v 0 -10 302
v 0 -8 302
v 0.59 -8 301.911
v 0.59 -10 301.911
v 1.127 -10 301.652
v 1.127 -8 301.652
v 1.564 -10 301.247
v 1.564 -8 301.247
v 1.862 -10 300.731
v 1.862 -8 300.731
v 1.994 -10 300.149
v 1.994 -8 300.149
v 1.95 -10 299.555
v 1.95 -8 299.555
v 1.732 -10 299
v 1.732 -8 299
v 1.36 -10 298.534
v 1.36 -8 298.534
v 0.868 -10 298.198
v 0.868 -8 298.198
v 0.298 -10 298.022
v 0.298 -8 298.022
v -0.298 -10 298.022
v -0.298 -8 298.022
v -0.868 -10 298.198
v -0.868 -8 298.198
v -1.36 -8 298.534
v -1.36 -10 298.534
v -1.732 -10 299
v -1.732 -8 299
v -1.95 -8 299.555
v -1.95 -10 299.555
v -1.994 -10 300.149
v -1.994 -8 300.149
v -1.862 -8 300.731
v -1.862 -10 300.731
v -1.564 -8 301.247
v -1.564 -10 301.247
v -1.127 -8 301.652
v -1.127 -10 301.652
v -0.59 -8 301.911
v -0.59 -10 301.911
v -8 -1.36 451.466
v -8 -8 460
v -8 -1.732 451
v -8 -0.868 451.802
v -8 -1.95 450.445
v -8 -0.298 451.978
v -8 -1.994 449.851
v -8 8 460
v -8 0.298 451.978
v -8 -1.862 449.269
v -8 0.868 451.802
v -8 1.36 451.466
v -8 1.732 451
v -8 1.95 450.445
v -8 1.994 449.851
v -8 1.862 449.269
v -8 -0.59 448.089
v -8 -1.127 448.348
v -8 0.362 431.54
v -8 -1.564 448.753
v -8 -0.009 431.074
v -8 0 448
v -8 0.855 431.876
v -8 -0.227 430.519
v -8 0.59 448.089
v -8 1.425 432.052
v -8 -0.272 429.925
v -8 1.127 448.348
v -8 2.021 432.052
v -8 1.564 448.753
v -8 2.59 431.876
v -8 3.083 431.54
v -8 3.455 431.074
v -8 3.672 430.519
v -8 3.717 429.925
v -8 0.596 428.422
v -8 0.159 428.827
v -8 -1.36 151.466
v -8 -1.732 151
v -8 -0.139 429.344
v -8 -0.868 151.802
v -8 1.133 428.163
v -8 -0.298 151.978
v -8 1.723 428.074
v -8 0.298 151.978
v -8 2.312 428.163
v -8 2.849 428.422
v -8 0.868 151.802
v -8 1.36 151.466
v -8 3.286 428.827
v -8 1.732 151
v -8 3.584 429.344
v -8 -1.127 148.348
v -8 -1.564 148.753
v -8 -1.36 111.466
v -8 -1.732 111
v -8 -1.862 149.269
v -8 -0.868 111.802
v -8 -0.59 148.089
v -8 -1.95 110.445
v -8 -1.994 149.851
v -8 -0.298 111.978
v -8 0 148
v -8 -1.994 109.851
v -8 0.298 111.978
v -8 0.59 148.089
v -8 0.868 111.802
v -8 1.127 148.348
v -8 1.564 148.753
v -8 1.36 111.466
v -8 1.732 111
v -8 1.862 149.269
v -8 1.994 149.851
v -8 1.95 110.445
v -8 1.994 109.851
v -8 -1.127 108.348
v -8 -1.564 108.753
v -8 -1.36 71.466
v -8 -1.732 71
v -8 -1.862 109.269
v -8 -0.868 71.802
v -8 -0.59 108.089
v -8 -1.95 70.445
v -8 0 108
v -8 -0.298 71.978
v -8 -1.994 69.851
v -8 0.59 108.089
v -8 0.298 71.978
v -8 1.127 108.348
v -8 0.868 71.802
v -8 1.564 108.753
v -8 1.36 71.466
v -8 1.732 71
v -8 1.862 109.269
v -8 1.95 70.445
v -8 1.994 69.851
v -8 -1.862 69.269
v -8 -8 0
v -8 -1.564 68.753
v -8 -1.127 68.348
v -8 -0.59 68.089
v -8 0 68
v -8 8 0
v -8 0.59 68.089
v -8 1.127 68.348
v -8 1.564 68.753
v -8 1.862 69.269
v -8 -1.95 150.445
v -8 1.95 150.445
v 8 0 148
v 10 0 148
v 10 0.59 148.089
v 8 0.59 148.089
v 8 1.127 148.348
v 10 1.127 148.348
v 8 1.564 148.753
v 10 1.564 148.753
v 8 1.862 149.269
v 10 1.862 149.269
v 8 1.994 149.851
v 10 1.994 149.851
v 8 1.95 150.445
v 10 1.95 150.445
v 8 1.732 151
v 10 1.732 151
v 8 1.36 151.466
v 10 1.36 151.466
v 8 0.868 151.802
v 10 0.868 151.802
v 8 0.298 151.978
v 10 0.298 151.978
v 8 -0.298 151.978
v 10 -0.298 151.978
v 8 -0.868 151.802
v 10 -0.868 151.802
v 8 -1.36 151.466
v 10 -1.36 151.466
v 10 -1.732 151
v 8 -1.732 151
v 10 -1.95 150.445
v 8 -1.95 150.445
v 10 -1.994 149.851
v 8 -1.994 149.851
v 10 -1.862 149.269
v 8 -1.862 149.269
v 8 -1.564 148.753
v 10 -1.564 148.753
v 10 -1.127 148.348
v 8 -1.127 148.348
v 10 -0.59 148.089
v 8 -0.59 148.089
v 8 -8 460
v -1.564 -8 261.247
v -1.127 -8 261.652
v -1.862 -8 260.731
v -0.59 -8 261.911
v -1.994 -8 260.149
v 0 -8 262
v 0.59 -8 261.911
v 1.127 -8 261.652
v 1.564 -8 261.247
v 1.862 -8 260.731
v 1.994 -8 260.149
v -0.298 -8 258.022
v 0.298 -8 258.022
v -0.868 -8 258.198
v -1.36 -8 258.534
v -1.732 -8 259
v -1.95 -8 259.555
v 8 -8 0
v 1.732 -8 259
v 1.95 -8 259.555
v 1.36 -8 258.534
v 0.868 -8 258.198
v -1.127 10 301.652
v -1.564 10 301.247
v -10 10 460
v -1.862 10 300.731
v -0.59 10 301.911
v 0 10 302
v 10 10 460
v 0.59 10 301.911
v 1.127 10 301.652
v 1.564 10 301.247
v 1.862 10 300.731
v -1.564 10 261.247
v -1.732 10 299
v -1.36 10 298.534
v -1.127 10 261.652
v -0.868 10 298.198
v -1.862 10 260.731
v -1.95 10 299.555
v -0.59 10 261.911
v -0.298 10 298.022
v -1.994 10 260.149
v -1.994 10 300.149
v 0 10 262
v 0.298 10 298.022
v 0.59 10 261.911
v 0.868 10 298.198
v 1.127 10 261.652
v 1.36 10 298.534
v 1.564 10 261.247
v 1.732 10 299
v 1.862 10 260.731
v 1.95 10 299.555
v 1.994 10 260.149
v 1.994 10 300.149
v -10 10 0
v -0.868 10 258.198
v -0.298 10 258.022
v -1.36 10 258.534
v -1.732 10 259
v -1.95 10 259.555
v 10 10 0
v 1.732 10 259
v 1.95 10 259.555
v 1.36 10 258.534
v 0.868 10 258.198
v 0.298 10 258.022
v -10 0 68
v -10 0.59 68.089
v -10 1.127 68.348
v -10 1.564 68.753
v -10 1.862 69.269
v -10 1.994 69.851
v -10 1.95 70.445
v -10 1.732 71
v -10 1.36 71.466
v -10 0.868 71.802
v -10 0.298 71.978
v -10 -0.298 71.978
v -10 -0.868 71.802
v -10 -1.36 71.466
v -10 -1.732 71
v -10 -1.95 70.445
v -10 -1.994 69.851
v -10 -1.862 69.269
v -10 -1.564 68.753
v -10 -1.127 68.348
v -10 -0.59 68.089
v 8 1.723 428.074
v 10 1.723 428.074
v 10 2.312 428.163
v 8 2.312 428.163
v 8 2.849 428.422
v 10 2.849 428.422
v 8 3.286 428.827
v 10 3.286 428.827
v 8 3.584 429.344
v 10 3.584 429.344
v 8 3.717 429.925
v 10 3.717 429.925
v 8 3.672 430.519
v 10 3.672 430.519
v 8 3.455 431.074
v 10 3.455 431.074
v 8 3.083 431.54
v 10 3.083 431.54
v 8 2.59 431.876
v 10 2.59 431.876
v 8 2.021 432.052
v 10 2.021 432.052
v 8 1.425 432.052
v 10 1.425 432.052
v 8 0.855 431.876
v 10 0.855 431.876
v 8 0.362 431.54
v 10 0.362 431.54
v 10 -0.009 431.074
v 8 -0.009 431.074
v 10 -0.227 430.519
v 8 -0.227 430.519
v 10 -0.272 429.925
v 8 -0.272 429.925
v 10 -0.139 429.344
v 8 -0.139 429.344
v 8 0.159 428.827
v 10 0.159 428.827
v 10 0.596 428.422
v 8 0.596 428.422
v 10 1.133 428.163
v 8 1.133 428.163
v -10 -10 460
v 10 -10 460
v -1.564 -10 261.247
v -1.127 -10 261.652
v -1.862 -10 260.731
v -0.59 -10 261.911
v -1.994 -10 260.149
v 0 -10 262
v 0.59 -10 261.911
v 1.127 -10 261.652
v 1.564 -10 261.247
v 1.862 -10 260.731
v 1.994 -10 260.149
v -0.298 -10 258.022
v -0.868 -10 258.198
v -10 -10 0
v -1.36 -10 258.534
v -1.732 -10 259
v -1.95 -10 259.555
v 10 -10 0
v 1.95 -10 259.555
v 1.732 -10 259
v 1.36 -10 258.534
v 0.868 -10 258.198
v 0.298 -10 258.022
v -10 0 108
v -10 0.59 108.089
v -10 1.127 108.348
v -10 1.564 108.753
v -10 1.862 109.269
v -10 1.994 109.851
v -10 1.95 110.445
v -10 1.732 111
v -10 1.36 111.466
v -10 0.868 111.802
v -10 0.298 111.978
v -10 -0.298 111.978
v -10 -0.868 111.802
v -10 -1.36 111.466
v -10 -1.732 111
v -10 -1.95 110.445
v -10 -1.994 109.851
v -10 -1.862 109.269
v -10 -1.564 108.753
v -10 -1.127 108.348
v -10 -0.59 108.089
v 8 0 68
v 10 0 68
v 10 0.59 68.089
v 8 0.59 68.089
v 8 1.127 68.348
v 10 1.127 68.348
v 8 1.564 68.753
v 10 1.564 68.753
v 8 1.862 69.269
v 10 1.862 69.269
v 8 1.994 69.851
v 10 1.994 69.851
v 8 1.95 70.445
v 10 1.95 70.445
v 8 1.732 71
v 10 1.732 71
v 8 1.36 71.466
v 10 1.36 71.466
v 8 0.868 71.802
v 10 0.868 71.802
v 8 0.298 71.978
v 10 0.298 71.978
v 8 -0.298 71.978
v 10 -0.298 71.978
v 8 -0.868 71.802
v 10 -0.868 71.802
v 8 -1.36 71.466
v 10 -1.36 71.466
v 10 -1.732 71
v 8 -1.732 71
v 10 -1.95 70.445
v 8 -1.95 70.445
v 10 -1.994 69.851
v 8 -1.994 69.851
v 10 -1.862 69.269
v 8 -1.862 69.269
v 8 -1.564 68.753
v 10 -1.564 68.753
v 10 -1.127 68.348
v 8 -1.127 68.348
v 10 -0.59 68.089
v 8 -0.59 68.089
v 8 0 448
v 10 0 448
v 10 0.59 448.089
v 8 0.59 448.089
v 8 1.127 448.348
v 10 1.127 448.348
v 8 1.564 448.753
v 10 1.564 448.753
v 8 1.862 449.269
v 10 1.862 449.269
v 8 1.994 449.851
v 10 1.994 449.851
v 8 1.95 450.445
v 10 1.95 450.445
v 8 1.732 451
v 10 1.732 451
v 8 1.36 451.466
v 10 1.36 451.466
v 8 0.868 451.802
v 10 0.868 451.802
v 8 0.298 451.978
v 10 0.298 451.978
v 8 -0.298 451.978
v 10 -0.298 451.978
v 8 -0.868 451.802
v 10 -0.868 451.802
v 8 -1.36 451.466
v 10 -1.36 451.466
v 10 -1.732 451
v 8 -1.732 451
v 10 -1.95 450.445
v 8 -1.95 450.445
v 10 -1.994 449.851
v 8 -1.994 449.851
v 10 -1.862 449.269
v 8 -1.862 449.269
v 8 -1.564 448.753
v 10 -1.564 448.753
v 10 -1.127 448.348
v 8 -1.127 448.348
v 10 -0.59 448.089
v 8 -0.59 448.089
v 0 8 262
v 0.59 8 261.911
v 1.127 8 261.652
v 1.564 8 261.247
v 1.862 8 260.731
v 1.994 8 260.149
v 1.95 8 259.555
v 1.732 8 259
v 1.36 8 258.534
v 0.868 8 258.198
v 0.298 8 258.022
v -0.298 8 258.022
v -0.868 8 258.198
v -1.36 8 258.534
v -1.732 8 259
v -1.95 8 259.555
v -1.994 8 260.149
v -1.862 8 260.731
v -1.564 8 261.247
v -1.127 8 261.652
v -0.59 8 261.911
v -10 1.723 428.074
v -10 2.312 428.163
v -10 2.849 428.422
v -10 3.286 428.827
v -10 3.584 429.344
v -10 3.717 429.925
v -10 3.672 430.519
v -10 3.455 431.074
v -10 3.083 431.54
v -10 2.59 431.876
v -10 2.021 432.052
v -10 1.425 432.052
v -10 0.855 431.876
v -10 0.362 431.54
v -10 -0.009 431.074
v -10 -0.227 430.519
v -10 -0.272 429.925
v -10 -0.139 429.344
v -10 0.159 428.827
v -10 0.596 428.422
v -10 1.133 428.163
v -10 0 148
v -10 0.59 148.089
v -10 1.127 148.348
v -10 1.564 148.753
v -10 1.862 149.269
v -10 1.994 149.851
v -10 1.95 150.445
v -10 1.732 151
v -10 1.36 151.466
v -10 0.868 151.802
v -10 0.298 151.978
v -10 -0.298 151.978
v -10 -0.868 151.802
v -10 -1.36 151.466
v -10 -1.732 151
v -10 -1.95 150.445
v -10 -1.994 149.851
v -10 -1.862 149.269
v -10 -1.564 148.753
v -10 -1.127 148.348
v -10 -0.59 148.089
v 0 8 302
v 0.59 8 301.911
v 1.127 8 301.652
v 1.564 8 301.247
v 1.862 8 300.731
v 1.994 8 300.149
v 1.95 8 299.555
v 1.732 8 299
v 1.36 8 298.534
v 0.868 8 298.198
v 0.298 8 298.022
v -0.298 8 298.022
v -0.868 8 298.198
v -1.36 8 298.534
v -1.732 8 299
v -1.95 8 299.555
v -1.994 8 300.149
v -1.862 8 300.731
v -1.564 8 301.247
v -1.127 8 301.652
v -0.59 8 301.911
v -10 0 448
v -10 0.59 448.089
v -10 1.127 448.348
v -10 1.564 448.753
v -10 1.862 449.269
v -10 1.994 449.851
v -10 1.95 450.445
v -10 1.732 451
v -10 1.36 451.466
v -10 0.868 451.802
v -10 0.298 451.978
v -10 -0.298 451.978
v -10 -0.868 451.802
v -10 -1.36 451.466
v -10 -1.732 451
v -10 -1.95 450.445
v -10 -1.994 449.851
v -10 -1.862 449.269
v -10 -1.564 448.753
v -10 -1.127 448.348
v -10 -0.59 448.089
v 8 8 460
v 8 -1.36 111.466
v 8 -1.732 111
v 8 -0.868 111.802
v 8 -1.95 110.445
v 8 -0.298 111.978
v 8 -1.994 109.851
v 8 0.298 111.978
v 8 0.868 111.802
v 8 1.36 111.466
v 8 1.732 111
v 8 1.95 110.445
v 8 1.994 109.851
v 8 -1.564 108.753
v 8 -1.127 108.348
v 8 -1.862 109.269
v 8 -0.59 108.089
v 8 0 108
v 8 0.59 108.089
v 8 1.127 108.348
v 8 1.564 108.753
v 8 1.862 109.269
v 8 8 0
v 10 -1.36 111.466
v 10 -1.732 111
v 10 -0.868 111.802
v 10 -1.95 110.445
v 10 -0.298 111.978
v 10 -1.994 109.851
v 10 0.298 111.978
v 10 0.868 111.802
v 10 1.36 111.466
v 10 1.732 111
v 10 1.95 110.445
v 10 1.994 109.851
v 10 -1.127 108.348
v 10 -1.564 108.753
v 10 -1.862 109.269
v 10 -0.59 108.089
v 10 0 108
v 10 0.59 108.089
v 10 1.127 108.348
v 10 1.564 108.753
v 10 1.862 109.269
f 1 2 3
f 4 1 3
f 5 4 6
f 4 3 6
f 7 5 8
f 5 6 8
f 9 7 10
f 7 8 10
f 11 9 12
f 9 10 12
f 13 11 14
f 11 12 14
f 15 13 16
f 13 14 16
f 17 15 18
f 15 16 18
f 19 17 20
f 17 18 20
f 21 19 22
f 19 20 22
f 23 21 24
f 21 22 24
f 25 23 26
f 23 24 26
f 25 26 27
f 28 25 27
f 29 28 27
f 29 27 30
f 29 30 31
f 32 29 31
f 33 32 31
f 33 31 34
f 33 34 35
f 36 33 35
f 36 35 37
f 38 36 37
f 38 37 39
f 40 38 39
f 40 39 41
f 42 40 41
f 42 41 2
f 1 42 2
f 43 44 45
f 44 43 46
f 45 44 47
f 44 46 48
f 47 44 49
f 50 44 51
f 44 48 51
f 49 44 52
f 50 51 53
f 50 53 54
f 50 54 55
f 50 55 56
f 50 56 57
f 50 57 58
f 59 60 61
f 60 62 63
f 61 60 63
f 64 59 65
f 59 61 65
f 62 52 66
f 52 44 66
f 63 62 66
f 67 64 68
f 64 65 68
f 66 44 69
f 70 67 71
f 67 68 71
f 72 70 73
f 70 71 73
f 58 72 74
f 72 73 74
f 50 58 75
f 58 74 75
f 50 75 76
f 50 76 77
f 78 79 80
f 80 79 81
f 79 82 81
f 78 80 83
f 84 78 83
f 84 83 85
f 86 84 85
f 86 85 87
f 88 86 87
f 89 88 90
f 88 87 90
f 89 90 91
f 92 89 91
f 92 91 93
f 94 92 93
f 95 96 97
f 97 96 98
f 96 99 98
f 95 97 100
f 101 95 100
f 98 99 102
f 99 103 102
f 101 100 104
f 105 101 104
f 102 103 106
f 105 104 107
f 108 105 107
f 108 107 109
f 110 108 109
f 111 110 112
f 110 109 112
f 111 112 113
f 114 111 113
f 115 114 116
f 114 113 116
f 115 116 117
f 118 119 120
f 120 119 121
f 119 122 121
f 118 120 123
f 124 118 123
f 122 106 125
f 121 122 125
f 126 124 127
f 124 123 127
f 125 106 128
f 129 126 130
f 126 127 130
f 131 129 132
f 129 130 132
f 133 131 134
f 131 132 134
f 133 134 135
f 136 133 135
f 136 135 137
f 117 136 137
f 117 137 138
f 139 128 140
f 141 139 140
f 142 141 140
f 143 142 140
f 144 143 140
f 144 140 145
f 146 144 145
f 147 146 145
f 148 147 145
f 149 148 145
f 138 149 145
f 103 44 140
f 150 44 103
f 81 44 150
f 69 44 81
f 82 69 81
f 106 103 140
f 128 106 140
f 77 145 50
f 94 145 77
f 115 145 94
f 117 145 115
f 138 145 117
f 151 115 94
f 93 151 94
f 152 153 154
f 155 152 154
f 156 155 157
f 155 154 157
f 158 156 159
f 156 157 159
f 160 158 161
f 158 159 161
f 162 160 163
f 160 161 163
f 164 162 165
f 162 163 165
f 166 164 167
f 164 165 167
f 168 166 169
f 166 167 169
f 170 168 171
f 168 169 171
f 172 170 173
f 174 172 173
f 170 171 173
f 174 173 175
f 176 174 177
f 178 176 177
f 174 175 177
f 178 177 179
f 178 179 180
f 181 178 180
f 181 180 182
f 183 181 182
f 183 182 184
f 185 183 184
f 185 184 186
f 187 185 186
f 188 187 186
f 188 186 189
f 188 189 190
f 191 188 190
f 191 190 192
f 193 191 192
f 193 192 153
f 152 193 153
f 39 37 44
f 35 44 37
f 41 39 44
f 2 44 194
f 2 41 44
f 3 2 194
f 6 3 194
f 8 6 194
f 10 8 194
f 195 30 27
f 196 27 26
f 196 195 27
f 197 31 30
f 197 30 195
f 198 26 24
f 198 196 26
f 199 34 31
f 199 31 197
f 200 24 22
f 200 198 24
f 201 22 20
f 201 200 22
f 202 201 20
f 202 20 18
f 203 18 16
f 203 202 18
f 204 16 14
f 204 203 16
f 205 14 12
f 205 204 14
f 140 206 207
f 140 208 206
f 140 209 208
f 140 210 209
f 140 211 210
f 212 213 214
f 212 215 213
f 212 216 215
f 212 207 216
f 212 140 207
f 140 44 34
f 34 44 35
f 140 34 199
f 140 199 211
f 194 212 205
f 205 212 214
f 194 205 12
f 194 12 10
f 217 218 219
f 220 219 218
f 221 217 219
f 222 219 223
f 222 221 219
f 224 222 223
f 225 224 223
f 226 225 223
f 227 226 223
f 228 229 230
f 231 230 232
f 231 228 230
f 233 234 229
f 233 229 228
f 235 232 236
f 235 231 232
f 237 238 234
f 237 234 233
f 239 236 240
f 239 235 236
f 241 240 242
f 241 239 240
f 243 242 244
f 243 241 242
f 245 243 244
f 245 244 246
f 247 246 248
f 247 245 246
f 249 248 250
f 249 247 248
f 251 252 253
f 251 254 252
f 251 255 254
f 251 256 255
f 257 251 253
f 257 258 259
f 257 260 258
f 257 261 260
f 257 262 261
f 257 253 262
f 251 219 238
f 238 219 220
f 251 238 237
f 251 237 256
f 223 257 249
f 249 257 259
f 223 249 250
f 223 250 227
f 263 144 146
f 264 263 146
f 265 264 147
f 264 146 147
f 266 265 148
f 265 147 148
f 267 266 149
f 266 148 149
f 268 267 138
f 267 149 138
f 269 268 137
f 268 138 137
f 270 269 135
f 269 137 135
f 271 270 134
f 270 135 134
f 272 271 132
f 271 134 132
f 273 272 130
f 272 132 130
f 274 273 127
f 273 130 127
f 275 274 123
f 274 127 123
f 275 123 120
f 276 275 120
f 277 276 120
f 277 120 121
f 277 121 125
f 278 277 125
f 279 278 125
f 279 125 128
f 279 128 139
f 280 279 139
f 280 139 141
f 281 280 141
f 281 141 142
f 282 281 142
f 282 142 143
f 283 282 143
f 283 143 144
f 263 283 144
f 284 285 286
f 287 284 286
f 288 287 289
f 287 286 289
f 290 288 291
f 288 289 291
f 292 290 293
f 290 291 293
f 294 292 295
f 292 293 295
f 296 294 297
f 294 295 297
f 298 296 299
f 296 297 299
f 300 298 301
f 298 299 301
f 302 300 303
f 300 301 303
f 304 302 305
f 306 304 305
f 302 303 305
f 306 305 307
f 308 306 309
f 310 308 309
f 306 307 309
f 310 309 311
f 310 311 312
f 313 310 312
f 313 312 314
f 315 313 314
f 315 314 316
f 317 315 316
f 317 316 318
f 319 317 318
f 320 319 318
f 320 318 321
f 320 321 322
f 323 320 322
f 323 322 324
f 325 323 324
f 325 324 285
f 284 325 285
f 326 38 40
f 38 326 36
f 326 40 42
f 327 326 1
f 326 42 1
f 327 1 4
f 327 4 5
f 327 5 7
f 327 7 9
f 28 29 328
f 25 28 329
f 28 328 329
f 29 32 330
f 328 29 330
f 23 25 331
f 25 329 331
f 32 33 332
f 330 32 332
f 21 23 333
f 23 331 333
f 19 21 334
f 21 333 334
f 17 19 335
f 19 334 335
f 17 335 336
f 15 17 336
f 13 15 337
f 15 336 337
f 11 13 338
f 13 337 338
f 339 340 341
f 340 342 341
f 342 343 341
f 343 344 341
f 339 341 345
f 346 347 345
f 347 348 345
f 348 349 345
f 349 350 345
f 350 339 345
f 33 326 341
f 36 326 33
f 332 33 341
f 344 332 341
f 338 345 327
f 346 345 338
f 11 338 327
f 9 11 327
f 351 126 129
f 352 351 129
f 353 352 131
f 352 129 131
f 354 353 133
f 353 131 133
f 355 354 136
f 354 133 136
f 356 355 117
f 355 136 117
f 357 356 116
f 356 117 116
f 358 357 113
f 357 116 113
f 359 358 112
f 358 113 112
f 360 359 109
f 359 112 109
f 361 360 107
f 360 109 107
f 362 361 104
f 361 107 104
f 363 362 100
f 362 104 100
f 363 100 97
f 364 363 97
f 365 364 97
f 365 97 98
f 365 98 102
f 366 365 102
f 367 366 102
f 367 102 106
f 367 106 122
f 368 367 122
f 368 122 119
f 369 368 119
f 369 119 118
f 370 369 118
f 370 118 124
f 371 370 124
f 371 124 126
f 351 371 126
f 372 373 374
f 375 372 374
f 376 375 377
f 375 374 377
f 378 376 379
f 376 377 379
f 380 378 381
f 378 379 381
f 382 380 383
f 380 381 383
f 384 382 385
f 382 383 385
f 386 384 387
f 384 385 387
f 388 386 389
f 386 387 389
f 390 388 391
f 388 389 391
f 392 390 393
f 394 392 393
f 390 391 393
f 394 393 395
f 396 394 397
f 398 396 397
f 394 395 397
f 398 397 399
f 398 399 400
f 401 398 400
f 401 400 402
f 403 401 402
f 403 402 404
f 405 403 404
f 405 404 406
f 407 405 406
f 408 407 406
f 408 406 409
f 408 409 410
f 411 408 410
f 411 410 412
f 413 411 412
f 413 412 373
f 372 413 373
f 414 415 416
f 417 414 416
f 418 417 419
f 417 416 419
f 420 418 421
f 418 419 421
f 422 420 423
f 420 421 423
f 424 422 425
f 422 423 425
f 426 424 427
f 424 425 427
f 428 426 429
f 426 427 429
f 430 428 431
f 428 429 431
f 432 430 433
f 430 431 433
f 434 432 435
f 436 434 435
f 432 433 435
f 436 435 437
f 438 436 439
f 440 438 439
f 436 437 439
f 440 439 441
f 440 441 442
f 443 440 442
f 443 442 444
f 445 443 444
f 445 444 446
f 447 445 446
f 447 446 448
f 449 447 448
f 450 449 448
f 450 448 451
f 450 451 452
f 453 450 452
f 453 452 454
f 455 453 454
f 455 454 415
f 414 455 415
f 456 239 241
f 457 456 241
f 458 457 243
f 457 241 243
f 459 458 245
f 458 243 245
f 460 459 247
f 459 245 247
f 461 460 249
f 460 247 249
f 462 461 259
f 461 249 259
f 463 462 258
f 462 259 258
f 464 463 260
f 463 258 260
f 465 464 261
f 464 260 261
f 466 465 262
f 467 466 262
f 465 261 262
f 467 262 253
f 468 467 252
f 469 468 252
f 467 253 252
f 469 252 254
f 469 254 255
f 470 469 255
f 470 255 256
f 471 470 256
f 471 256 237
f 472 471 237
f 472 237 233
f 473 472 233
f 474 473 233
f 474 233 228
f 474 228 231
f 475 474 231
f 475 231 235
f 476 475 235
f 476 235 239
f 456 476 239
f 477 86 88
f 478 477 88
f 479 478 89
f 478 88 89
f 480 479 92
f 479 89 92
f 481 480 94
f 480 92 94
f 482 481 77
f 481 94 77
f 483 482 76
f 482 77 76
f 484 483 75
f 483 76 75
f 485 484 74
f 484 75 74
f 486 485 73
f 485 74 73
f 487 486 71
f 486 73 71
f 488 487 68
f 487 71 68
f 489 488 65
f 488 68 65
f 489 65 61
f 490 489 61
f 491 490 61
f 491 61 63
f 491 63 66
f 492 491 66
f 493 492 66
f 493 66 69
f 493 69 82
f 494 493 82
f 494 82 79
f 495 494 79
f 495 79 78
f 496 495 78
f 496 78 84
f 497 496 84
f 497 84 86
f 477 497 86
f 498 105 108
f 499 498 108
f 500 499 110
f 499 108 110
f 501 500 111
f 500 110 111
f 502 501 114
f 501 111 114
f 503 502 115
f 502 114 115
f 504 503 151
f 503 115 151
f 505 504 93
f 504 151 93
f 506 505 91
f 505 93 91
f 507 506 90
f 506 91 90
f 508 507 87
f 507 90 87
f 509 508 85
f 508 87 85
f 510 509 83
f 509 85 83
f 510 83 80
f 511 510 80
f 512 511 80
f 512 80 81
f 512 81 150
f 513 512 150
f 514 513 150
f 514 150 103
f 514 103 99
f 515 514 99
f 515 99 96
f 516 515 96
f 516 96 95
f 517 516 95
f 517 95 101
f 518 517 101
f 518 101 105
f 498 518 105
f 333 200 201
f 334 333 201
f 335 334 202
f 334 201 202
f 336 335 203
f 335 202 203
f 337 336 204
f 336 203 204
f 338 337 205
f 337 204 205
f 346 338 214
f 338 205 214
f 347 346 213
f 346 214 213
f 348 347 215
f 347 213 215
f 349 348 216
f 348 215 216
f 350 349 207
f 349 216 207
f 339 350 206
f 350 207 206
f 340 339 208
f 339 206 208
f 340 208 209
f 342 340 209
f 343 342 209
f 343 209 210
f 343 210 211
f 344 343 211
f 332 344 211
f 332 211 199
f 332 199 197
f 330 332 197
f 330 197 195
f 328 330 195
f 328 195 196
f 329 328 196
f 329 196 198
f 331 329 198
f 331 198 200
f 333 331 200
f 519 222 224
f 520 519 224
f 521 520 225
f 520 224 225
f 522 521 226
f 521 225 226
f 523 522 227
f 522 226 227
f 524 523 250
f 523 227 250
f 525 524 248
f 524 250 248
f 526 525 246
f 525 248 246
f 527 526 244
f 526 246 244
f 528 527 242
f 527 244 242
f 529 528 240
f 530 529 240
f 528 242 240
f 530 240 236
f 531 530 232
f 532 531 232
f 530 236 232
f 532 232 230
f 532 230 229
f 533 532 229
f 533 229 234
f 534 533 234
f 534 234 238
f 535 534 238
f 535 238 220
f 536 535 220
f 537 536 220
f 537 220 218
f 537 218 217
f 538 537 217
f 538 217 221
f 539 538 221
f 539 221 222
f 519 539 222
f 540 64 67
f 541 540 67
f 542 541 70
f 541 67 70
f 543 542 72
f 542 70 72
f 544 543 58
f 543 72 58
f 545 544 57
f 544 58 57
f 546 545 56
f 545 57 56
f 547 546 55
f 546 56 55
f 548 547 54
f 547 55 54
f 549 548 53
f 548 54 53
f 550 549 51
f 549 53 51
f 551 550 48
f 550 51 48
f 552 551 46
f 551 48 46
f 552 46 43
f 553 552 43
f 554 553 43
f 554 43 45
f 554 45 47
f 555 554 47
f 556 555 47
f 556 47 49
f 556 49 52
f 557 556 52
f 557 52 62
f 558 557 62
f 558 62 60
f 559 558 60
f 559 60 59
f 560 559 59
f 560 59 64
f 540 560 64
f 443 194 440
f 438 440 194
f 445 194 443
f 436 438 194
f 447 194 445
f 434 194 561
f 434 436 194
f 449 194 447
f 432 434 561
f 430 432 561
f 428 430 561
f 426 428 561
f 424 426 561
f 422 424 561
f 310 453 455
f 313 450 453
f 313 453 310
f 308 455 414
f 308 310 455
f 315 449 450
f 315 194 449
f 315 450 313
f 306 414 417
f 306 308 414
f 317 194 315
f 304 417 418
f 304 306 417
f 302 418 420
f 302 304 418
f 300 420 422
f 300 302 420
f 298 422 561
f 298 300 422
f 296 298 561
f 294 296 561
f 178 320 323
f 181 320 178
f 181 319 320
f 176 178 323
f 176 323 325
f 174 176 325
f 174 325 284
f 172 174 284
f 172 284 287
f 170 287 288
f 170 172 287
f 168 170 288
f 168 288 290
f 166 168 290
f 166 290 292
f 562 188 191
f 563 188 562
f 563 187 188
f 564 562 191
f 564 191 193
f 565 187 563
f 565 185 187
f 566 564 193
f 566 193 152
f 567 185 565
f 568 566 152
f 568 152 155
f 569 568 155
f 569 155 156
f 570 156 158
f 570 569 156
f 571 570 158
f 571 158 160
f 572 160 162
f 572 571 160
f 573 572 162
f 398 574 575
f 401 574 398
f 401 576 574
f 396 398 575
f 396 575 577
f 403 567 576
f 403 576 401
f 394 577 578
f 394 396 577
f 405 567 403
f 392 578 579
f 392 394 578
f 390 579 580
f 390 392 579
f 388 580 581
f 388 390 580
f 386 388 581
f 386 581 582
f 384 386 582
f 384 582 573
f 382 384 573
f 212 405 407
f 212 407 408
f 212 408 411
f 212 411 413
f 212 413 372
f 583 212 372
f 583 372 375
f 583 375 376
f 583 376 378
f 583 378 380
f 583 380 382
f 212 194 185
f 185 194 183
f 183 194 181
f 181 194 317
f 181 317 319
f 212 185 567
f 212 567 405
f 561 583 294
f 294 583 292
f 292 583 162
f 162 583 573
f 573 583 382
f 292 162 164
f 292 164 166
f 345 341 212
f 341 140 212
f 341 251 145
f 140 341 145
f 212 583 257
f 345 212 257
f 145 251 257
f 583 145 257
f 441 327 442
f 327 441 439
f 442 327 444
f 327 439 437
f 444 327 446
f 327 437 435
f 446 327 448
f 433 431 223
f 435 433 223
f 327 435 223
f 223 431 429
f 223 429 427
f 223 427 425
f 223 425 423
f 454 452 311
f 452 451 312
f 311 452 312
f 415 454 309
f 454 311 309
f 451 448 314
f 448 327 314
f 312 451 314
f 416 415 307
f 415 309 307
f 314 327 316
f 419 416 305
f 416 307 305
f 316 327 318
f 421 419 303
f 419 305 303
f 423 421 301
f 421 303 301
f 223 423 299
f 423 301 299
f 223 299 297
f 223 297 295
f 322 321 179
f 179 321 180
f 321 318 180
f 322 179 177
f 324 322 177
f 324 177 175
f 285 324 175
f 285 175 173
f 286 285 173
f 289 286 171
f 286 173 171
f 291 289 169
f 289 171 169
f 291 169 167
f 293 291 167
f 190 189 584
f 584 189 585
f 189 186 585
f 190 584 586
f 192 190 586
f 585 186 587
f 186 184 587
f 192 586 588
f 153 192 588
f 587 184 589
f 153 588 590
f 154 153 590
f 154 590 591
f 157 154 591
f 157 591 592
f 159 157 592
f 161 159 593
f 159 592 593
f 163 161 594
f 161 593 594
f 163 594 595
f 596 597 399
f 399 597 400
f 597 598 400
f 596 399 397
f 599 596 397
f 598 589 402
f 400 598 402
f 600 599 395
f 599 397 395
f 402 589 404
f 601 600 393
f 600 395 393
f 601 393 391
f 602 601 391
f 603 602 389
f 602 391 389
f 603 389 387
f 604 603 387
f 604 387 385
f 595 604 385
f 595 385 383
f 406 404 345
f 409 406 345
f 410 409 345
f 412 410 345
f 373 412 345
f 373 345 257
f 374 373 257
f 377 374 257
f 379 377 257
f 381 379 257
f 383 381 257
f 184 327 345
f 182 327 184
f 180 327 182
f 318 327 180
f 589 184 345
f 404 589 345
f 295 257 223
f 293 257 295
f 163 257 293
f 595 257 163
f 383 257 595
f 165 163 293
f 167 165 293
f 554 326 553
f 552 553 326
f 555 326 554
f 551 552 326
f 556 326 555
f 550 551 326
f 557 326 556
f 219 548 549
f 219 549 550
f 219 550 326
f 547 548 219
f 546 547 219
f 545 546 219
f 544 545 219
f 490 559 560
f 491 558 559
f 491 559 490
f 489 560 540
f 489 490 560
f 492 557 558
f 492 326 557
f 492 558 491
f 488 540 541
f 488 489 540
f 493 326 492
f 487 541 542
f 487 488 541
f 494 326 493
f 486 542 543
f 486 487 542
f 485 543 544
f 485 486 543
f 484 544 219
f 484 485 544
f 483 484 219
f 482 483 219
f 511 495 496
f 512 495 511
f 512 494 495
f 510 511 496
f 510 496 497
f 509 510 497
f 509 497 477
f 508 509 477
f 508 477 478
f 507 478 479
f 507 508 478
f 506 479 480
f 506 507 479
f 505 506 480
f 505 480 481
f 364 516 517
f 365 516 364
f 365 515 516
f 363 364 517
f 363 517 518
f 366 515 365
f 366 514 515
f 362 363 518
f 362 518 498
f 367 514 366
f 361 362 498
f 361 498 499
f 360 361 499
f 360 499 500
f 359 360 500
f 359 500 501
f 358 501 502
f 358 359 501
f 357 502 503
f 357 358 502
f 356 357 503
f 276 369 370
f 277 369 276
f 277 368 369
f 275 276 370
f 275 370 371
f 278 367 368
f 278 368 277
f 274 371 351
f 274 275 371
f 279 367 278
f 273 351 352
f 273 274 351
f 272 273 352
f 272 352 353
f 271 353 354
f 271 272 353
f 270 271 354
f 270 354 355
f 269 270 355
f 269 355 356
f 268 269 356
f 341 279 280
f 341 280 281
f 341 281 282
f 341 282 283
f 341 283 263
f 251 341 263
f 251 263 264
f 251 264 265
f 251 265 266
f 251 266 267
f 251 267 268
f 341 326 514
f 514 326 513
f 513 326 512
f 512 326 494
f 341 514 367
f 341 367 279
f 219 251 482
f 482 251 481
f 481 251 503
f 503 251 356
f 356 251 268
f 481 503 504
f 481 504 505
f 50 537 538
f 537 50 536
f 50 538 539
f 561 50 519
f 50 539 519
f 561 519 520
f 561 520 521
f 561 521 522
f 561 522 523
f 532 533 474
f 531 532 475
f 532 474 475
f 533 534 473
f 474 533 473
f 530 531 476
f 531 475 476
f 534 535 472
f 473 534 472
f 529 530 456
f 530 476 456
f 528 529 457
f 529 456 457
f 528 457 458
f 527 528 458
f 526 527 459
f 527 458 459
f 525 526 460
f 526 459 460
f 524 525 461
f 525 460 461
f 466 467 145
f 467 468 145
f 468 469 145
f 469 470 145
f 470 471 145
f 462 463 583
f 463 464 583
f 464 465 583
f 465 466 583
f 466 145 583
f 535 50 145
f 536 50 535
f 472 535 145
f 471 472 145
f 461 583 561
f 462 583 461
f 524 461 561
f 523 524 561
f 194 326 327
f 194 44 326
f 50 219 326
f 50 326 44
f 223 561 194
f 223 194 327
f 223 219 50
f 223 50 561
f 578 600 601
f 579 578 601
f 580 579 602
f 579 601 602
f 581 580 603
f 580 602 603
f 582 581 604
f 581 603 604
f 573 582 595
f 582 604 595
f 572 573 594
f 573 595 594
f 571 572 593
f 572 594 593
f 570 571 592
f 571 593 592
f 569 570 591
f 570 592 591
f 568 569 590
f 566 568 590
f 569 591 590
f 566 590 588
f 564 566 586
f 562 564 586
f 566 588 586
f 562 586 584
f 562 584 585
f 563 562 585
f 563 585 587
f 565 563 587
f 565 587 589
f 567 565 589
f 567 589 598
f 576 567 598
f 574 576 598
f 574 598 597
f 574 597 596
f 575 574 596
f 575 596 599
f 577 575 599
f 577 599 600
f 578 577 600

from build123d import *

# Parameters (mm, degrees)
SKETCH_1_W          = 20
SKETCH_1_H          = 20
SKETCH_1_W_2        = 16
SKETCH_1_H_2        = 16
EXTRUDE_1_DEPTH     = 460
SKETCH_2_R          = 2
CUT_EXTRUDE_1_DEPTH = 461.543157587
SKETCH_3_R          = 2
CUT_EXTRUDE_2_DEPTH = 461.543157587


with BuildPart() as part:
    # 草图1 → 凸台-拉伸1 (new body)
    with BuildSketch(Plane.XY):
        Rectangle(SKETCH_1_W, SKETCH_1_H)
        Rectangle(SKETCH_1_W_2, SKETCH_1_H_2, mode=Mode.SUBTRACT)
    extrude(amount=EXTRUDE_1_DEPTH)

    # 草图2 → 切除-拉伸1 (cut, through all)
    with BuildSketch(Plane(origin=(10, 0, 0), x_dir=(0, 0, -1), z_dir=(1, 0, 0))):
        with Locations((-450, 0)):
            Circle(SKETCH_2_R)
        with Locations((-70, 0)):
            Circle(SKETCH_2_R)
        with Locations((-110, 0)):
            Circle(SKETCH_2_R)
        with Locations((-150, 0)):
            Circle(SKETCH_2_R)
        with Locations((-37.153023279, -18.374821325)):
            Circle(SKETCH_2_R)
        with Locations((-17.227343837, -16.652236413)):
            Circle(SKETCH_2_R)
        with Locations((-430.074320558, 1.722584912)):
            Circle(SKETCH_2_R)
    extrude(amount=-CUT_EXTRUDE_1_DEPTH, mode=Mode.SUBTRACT)

    # 草图3 → 切除-拉伸2 (cut, through all)
    with BuildSketch(Plane(origin=(0, 10, 0), x_dir=(1, 0, 0), z_dir=(0, 1, 0))):
        with Locations(Location((0, -260, 0), (0, 0, 270))):
            Circle(SKETCH_3_R)
        with Locations(Location((0, -300, 0), (0, 0, 270))):
            Circle(SKETCH_3_R)
    extrude(amount=-CUT_EXTRUDE_2_DEPTH, mode=Mode.SUBTRACT)


solid = part.part
